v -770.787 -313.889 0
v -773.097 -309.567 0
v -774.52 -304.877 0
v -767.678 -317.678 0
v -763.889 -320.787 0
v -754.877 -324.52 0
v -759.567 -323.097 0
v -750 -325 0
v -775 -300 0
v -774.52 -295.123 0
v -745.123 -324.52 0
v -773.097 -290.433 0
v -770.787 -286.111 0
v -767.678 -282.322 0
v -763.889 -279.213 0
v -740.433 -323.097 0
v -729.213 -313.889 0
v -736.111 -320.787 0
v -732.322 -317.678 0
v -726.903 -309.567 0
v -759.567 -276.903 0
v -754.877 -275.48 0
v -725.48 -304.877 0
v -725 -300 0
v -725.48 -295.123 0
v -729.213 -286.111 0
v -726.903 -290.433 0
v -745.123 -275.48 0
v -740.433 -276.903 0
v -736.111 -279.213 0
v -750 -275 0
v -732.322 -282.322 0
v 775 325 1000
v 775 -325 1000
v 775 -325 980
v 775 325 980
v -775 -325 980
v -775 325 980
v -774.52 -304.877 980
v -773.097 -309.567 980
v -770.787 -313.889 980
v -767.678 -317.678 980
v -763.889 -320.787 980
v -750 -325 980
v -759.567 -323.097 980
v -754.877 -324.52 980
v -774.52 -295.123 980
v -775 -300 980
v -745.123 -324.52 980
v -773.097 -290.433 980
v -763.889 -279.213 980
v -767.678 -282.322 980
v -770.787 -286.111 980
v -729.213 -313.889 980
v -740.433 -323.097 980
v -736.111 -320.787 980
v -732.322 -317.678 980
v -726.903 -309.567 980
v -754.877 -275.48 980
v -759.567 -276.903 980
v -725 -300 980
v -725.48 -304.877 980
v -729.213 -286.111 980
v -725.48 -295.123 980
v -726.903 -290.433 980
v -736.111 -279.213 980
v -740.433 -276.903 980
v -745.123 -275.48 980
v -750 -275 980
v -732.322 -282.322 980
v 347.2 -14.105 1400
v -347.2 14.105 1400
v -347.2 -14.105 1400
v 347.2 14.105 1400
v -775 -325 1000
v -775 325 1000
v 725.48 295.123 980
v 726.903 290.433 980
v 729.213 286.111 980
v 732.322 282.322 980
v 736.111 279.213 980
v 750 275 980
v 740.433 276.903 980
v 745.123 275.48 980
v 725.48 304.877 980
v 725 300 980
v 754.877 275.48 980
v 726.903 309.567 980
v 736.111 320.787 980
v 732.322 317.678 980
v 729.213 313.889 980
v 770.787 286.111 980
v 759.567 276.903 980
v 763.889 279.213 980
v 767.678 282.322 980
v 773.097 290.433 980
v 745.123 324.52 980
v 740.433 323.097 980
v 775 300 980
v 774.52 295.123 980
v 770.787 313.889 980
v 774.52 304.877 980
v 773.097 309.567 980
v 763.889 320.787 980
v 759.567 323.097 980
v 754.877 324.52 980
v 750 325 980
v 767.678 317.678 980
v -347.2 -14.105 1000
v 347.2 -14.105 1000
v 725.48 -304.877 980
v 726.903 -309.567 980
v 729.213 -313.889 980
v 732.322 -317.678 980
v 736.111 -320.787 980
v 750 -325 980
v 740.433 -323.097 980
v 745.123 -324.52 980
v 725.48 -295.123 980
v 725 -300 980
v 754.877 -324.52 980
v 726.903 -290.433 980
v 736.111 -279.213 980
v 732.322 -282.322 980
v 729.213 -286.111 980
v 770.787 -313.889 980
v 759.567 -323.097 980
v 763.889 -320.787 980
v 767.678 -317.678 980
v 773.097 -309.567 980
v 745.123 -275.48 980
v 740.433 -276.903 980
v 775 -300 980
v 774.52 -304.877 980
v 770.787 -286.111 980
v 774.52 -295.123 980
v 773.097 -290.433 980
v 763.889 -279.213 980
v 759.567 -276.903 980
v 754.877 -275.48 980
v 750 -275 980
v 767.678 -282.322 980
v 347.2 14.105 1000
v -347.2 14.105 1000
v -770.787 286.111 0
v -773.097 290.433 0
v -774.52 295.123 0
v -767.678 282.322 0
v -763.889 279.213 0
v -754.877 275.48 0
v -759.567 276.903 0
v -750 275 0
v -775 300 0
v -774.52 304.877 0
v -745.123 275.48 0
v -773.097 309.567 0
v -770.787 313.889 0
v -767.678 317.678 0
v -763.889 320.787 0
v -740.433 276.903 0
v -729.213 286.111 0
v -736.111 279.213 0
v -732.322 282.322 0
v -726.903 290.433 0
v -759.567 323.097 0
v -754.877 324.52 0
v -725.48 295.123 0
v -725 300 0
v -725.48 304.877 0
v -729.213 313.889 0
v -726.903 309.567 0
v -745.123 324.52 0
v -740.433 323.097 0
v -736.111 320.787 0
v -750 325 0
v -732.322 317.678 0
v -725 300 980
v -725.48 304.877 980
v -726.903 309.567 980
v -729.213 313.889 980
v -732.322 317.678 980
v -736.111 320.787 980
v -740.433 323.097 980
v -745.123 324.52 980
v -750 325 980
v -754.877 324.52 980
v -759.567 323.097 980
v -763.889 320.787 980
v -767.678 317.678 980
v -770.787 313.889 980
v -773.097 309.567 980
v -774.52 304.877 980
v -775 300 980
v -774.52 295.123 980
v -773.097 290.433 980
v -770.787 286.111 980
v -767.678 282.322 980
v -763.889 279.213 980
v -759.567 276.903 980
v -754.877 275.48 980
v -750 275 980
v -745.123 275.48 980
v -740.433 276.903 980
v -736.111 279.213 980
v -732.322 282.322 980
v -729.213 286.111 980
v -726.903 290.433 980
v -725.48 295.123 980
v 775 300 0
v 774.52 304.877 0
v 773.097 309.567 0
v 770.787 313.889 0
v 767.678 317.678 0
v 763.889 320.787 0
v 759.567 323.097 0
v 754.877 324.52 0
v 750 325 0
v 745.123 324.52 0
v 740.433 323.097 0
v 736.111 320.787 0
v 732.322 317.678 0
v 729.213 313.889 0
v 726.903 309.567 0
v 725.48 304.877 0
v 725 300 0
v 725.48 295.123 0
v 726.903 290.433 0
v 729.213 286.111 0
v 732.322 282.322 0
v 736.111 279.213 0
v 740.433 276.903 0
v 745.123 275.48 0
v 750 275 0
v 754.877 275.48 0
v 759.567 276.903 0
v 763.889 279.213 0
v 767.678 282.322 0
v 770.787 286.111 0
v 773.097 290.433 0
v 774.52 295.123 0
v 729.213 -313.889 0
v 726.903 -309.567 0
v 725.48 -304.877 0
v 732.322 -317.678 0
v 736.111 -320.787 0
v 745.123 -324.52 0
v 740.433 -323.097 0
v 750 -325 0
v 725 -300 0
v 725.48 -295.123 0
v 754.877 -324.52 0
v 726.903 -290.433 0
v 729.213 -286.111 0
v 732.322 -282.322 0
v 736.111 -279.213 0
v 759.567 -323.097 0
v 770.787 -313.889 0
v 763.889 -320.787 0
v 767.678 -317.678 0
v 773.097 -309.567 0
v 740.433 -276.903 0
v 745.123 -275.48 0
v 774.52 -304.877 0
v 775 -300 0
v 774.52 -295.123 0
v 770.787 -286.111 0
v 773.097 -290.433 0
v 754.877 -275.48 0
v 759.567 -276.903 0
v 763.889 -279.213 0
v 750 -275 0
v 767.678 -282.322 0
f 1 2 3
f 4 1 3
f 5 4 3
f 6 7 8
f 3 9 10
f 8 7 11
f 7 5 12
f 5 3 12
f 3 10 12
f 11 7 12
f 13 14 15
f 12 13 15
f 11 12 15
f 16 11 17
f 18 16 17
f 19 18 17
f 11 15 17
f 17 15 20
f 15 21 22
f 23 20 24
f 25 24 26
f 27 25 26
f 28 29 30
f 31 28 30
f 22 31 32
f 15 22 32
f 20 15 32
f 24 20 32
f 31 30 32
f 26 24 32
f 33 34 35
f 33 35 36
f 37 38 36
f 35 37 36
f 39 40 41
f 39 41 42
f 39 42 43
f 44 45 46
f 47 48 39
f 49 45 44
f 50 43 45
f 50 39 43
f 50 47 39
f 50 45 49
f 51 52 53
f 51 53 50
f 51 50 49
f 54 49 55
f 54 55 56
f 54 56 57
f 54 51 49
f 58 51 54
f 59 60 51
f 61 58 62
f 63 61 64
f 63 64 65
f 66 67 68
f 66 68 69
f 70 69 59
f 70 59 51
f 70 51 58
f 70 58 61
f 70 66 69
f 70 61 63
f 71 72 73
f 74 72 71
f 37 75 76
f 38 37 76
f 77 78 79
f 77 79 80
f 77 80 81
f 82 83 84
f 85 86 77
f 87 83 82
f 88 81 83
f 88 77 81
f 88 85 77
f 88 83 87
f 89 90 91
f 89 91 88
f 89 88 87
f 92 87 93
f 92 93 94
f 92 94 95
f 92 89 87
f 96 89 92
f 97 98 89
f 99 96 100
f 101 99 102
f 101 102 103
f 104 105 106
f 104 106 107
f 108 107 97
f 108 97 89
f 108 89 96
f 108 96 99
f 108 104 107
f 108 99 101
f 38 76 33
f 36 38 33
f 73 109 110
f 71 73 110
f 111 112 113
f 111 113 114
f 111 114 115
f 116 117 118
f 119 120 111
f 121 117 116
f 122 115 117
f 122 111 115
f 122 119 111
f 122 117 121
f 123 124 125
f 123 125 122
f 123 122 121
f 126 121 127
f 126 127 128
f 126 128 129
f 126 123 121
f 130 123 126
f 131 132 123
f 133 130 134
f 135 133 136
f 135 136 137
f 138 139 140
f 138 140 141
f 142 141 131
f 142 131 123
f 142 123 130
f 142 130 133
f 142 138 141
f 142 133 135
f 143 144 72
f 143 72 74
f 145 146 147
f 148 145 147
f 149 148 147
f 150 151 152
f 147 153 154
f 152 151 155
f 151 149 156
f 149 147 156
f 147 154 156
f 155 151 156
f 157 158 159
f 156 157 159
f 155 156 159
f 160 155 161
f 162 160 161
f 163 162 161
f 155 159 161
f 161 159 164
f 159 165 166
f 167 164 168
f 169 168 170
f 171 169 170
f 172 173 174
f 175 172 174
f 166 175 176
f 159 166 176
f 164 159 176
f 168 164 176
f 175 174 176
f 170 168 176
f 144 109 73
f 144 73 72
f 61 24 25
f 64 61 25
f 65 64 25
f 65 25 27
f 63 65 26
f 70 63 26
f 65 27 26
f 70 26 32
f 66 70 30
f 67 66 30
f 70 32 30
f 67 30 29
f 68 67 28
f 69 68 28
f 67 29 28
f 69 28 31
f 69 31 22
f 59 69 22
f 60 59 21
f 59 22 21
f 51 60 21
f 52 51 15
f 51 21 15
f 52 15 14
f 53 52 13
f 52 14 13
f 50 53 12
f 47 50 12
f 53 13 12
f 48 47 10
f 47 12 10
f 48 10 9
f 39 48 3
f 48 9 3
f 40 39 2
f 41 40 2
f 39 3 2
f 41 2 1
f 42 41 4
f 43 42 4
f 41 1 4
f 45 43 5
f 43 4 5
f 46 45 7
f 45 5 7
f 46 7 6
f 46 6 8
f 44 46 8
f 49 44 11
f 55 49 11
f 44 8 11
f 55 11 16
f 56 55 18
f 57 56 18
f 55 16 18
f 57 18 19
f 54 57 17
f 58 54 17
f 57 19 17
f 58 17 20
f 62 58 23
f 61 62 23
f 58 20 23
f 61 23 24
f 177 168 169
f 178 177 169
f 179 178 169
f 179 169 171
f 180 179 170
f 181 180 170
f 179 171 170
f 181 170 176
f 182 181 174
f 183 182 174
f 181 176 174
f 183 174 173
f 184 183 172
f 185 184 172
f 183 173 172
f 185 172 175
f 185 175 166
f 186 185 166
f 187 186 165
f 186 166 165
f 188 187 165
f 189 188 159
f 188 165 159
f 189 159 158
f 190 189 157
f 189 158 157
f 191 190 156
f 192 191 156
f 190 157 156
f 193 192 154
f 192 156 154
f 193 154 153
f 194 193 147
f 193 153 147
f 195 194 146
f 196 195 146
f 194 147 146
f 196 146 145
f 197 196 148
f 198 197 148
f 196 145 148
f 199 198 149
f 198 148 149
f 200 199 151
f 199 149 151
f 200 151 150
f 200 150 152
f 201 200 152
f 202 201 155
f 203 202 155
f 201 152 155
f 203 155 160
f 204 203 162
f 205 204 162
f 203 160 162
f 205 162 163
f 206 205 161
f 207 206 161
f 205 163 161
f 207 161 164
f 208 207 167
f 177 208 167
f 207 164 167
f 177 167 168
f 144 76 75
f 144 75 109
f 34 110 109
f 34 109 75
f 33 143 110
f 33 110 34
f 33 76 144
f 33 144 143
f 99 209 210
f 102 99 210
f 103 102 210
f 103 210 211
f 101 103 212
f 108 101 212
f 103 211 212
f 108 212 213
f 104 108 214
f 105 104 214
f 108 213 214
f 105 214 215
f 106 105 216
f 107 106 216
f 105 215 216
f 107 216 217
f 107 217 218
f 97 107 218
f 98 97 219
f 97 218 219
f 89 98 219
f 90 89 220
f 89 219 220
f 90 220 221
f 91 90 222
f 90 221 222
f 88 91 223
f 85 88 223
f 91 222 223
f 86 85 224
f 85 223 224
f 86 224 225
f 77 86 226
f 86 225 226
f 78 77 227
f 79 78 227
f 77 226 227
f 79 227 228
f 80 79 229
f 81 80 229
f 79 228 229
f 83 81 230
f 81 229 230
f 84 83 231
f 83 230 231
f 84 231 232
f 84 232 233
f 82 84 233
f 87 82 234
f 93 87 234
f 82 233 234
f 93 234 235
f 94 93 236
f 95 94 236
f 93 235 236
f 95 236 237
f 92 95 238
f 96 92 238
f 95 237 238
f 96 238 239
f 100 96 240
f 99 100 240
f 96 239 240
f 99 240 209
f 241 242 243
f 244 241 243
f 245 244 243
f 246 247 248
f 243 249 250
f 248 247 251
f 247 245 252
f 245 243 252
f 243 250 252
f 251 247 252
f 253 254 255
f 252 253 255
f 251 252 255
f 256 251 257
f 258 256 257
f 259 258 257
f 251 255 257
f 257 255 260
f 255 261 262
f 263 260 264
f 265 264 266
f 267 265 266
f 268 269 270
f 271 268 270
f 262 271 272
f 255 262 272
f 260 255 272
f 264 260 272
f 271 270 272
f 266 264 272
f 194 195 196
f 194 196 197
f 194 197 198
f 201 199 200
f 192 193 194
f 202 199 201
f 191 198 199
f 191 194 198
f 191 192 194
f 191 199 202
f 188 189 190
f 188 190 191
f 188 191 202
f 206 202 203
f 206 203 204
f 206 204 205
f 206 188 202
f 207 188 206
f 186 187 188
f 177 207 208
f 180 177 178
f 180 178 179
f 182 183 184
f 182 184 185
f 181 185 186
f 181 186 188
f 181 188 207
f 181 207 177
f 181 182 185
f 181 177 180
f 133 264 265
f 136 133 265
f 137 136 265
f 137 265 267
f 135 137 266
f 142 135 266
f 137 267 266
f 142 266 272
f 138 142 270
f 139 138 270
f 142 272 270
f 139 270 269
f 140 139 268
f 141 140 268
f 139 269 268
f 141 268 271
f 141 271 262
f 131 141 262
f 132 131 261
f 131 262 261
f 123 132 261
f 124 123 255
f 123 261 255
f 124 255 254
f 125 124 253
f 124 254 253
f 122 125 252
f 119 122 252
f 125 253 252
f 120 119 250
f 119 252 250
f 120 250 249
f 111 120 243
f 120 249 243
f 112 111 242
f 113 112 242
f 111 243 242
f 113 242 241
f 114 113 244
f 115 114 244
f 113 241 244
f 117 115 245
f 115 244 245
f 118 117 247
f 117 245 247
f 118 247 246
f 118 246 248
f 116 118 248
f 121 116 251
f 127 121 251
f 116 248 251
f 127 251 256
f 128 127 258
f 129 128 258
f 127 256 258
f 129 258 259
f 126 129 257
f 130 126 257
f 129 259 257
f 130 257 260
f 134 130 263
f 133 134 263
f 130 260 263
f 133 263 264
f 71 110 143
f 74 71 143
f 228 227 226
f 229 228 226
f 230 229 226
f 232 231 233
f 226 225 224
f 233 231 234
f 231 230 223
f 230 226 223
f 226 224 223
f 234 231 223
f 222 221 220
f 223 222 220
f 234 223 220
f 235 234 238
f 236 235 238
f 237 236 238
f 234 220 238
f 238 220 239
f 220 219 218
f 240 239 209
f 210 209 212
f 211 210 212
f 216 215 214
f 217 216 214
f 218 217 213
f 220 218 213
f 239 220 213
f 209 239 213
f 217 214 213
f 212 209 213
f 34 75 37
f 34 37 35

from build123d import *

# Parameters (mm, degrees)
F1_R     = 25
F3_DEPTH = 980
F2_W     = 1550
F2_H     = 650
F4_DEPTH = 20
F5_W     = 694.399952
F5_H     = 28.21
F6_DEPTH = 400


with BuildPart() as f3:
    # F1 (on Top) → F3 (new body)
    with BuildSketch(Plane.XY):
        with Locations((-750, 300)):
            Circle(F1_R)
        with Locations((-750, -300)):
            Circle(F1_R)
        with Locations((750, -300)):
            Circle(F1_R)
        with Locations((750, 300)):
            Circle(F1_R)
    extrude(amount=F3_DEPTH)


with BuildPart() as f4:
    # F2 (on offset) → F4 (new body)
    with BuildSketch(Plane.XY.offset(1000)):
        Rectangle(F2_W, F2_H)
    extrude(amount=-F4_DEPTH)

    # F5 (on offset) → F6 (join)
    with BuildSketch(Plane.XY.offset(1000)):
        Rectangle(F5_W, F5_H)
    extrude(amount=F6_DEPTH)


solid = Compound([f3.part, f4.part])
